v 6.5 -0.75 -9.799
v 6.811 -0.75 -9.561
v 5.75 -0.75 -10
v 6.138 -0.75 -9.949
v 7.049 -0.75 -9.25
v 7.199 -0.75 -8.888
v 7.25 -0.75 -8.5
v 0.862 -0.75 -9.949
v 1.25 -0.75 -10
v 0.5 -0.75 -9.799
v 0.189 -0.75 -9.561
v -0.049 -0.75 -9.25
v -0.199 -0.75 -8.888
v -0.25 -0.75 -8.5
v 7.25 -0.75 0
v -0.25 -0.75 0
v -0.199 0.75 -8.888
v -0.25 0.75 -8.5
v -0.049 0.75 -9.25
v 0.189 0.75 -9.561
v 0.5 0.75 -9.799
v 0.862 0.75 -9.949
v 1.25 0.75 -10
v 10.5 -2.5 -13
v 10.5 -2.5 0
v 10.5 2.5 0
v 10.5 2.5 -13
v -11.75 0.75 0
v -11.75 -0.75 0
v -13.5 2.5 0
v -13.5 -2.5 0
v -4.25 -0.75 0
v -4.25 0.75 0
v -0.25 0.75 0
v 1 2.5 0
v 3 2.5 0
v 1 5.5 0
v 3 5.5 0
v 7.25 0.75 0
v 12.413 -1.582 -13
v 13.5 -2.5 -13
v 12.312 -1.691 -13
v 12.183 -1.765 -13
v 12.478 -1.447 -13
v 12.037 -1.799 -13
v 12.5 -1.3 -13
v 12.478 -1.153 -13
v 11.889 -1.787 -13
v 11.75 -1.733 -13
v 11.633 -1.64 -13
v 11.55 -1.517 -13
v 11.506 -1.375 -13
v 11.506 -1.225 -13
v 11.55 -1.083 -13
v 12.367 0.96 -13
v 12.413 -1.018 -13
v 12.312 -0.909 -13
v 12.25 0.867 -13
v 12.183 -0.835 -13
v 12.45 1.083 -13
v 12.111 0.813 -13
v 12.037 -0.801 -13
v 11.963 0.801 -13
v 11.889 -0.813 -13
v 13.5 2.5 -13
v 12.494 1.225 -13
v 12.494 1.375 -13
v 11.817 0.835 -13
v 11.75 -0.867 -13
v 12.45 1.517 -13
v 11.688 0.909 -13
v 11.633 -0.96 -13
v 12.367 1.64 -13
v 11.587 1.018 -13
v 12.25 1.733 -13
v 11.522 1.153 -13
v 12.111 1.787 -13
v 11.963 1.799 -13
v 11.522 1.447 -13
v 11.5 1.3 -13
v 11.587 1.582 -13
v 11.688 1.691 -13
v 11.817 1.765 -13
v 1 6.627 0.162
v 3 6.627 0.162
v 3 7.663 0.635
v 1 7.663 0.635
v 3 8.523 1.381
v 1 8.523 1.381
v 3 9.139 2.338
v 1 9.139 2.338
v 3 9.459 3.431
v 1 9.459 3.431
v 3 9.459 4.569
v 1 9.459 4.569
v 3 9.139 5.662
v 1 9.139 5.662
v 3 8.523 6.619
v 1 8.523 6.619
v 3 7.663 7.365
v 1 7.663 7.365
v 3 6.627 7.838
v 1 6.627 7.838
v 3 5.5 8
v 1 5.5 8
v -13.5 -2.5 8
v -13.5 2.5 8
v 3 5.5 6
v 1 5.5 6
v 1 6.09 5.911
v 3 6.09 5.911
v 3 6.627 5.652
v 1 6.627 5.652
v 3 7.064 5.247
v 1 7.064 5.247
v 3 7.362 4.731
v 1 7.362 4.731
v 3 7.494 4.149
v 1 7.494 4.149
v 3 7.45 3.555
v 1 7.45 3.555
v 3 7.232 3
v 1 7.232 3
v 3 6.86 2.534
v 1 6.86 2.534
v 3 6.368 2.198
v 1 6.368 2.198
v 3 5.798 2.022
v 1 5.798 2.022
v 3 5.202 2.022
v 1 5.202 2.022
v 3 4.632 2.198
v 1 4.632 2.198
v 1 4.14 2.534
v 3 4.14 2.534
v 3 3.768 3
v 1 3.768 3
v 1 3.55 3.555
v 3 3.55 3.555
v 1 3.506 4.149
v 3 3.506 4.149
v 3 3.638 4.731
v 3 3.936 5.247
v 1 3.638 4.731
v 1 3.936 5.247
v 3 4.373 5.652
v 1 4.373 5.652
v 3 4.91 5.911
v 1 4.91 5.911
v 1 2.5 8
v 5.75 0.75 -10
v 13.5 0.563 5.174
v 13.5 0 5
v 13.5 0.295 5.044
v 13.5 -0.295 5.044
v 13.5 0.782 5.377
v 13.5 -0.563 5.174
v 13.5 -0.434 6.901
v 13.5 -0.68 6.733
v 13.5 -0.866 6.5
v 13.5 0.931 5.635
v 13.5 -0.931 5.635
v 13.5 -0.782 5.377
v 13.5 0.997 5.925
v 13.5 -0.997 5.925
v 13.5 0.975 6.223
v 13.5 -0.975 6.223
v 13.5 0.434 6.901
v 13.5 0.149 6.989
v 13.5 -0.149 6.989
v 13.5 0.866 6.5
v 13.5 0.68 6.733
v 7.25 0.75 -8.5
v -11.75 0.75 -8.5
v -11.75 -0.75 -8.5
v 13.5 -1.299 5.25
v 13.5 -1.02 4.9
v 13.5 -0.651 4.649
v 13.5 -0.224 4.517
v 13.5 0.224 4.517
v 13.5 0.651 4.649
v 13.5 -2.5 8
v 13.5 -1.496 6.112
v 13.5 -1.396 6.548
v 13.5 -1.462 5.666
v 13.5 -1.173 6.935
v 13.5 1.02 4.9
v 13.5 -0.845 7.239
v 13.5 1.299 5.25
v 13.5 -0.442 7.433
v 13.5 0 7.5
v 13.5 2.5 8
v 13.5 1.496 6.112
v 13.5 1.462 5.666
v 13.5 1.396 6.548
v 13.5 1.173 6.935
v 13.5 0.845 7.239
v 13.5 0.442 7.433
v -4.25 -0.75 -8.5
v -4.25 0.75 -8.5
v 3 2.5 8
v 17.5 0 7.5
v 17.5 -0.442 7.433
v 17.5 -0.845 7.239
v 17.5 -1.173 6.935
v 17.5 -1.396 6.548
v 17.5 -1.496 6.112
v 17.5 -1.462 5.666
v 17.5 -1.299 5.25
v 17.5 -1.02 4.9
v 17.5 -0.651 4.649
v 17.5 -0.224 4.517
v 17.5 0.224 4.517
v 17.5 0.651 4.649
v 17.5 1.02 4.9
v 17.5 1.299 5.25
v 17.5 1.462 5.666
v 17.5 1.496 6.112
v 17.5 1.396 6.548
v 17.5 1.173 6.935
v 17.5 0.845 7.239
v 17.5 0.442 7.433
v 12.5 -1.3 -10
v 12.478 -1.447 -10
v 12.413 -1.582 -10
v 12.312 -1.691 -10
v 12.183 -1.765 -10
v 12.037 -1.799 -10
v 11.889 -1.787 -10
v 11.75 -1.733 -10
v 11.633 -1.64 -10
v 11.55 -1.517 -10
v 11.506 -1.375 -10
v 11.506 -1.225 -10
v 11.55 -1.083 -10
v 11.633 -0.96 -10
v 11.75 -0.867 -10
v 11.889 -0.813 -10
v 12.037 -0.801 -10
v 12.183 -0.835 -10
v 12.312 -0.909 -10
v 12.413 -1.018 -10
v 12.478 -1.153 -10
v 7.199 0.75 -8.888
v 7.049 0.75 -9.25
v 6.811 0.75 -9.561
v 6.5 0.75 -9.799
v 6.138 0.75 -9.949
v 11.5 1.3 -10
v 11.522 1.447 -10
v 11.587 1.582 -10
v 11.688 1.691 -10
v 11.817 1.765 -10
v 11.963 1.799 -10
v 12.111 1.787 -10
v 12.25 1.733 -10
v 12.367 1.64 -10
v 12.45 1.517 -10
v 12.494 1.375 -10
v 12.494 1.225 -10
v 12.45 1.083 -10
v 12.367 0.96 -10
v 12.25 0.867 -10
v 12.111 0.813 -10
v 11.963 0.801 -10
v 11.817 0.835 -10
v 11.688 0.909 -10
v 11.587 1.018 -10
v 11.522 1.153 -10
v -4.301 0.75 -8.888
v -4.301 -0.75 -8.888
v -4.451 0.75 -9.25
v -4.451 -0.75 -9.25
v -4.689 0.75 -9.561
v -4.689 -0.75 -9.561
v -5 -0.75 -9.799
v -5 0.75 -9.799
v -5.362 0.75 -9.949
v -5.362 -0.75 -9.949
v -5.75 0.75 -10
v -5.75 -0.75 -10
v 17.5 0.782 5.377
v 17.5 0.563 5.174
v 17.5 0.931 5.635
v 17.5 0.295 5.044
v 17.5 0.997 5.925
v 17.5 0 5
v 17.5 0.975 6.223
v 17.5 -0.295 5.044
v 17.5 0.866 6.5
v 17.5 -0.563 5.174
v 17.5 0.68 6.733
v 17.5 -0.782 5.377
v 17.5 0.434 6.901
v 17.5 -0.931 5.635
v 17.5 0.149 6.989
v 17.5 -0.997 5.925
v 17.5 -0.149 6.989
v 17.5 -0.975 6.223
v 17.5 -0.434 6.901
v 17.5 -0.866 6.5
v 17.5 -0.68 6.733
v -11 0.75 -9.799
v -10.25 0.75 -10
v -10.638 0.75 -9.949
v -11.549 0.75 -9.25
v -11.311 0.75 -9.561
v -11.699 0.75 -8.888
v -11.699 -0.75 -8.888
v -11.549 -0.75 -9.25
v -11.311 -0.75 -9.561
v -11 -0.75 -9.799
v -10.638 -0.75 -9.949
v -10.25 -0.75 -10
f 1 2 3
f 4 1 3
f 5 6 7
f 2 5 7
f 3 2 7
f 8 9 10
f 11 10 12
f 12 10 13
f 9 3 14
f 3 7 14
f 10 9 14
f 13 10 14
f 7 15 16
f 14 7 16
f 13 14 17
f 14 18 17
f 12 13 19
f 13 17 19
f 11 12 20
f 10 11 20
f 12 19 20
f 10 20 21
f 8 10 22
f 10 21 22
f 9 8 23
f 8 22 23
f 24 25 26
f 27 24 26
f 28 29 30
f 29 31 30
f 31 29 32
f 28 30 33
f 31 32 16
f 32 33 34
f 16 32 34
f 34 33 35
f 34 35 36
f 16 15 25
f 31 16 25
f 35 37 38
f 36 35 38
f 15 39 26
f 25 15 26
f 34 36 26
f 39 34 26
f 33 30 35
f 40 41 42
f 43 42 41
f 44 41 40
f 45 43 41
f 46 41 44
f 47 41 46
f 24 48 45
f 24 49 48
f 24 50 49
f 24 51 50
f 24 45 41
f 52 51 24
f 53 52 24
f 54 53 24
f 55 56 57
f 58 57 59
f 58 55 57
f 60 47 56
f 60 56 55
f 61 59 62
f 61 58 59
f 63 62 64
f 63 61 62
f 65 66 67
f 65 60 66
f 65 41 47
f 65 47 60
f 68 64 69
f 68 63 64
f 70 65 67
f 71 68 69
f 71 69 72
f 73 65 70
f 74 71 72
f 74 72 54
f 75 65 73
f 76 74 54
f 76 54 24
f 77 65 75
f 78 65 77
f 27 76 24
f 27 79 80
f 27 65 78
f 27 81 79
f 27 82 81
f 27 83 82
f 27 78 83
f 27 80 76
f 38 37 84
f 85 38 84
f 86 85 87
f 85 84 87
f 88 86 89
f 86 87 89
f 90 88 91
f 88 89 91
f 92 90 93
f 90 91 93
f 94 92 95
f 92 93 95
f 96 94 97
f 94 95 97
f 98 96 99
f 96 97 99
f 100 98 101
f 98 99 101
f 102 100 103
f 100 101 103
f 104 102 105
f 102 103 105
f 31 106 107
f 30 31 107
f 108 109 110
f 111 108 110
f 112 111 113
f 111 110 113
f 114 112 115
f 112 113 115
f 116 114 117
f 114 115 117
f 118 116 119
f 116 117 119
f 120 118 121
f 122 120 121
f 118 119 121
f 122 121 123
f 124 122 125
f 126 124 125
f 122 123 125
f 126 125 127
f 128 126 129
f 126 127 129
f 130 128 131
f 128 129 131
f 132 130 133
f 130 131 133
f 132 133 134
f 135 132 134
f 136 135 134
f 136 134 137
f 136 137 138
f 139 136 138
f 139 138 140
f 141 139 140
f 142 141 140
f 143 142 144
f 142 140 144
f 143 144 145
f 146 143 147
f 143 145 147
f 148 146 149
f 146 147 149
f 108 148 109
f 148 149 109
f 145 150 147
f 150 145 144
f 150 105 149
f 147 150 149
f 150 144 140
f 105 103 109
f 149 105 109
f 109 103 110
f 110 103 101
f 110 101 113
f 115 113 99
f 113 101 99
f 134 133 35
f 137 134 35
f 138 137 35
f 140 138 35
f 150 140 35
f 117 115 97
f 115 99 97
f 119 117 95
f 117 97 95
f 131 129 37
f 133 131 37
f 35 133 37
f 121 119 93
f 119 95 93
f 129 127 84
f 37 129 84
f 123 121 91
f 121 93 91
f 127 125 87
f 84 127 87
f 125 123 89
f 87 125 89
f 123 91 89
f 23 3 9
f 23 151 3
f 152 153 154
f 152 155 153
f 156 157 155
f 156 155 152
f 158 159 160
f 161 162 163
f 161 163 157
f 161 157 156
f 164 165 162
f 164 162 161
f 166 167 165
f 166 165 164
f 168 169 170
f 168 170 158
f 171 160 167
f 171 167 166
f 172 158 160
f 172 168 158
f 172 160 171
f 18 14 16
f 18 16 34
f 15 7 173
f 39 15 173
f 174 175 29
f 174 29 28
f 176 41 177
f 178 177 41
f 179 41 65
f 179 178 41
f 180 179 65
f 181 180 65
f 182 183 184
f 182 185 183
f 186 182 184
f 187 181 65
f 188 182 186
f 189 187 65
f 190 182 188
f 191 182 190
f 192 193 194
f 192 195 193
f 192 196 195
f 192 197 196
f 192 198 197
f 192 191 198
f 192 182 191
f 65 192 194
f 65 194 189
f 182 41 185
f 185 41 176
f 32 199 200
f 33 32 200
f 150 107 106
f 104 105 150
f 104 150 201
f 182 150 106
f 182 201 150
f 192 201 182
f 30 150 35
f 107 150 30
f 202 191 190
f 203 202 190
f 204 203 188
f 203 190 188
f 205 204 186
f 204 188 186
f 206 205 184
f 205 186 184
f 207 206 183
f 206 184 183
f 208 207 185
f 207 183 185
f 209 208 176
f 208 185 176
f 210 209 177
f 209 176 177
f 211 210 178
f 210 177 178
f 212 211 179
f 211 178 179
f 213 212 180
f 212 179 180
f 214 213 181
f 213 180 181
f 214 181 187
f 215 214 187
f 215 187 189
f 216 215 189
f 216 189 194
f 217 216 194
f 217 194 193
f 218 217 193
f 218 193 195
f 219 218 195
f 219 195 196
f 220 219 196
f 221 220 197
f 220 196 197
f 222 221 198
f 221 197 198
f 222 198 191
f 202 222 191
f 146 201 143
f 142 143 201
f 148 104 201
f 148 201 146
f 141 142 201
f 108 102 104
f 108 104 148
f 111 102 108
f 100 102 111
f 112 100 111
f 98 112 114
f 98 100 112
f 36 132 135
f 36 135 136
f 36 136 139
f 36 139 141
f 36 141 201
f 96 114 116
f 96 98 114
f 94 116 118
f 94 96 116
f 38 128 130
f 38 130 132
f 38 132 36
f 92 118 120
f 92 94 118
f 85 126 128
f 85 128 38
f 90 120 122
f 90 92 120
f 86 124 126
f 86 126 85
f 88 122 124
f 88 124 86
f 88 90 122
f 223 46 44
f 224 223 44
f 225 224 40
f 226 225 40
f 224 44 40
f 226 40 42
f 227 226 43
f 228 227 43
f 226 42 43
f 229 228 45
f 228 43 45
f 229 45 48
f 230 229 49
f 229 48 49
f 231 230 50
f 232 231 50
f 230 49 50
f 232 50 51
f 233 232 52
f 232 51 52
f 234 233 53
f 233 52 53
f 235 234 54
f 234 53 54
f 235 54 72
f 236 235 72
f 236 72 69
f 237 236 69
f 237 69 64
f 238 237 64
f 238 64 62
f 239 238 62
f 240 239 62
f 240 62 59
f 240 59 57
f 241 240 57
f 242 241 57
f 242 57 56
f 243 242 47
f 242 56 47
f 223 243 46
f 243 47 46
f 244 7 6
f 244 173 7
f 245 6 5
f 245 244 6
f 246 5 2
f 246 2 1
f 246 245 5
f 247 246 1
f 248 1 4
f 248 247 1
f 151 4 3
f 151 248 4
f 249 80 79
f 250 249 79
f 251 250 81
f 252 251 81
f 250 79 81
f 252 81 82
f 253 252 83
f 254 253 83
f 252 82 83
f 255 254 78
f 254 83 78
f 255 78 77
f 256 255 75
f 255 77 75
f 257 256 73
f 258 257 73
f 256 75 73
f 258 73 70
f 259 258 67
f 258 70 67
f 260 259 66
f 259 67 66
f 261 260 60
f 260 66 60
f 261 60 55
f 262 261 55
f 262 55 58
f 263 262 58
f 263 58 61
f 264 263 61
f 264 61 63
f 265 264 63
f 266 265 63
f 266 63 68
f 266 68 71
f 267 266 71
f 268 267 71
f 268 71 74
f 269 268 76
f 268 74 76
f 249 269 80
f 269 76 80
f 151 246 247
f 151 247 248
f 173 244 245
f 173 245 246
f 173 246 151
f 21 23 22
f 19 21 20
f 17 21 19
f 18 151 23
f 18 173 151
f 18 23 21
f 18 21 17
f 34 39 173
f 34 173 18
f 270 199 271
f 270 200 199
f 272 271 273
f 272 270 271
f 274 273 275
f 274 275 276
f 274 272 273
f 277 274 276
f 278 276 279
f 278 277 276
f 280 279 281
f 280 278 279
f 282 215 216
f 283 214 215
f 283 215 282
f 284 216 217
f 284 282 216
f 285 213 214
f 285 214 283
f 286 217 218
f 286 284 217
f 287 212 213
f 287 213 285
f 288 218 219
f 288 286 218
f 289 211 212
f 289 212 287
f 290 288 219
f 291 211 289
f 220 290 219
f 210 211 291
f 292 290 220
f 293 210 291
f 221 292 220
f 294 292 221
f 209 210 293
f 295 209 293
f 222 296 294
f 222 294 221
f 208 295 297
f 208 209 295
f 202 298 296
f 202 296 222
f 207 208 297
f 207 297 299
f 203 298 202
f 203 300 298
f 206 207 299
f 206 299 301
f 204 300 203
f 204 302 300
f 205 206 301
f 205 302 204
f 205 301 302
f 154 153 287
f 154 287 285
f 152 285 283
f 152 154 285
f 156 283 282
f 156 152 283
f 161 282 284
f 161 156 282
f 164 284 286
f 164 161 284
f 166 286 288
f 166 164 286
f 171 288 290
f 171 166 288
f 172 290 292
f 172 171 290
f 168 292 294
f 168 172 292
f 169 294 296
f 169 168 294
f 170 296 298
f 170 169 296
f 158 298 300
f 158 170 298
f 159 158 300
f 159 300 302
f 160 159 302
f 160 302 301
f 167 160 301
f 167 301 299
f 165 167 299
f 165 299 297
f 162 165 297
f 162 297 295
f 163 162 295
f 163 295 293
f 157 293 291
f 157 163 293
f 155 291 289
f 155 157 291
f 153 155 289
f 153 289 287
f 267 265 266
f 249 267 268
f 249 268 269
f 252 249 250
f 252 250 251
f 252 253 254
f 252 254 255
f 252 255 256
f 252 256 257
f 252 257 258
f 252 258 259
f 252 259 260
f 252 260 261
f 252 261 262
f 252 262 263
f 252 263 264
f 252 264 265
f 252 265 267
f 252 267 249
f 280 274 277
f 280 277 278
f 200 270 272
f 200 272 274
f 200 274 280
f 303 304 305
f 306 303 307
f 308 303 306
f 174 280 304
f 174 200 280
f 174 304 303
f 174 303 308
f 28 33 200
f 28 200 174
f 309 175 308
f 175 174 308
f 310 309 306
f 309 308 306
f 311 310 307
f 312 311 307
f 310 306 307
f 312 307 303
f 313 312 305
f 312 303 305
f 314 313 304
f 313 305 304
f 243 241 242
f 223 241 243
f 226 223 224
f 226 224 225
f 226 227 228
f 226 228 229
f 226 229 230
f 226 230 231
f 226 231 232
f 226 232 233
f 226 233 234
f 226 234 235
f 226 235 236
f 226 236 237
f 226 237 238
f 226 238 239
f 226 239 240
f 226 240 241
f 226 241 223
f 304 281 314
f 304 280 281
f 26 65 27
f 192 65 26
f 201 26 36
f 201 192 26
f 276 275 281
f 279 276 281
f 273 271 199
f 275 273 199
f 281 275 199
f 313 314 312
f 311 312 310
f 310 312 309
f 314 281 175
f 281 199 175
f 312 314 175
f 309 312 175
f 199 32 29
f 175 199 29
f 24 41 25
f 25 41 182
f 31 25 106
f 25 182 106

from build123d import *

# Parameters (mm, degrees)
SKETCH_1_W          = 27
SKETCH_1_H          = 5
EXTRUDE_1_DEPTH     = 8
SKETCH_2_W          = 3
SKETCH_2_H          = 5
EXTRUDE_2_DEPTH     = 13
SKETCH_3_R          = 0.5
CUT_EXTRUDE_1_DEPTH = 3
SKETCH_4_R          = 1.5
SKETCH_4_R_2        = 1
EXTRUDE_3_DEPTH     = 4
SKETCH_6_R          = 2
EXTRUDE_5_DEPTH     = 2
SKETCH_7_W          = 7.5
SKETCH_7_H          = 1.5
EXTRUDE_6_DEPTH     = 10
FILLET_1_R          = 1.5


with BuildPart() as part:
    # 草图1 → 凸台-拉伸1 (new body)
    with BuildSketch(Plane.XY):
        Rectangle(SKETCH_1_W, SKETCH_1_H)
    extrude(amount=EXTRUDE_1_DEPTH)

    # 草图2 → 凸台-拉伸2 (add)
    with BuildSketch(Plane(origin=(0, 0, 0), x_dir=(-1, 0, 0), z_dir=(0, 0, -1))):
        with Locations((-12, 0)):
            Rectangle(SKETCH_2_W, SKETCH_2_H)
    extrude(amount=EXTRUDE_2_DEPTH)

    # 草图3 → 切除-拉伸1 (cut)
    with BuildSketch(Plane(origin=(0, 0, -13), x_dir=(-1, 0, 0), z_dir=(0, 0, -1))):
        with Locations((-12, 1.3)):
            Circle(SKETCH_3_R)
        with Locations(Location((-12, -1.3, 0), (0, 0, 180))):
            Circle(SKETCH_3_R)
    extrude(amount=-CUT_EXTRUDE_1_DEPTH, mode=Mode.SUBTRACT)

    # 草图4 → 凸台-拉伸3 (add)
    with BuildSketch(Plane(origin=(13.5, 0, 0), x_dir=(0, 0, -1), z_dir=(1, 0, 0))):
        with Locations(Location((-6, 0, 0), (0, 0, 180))):
            Circle(SKETCH_4_R)
        with Locations((-6, 0)):
            Circle(SKETCH_4_R_2, mode=Mode.SUBTRACT)
    extrude(amount=EXTRUDE_3_DEPTH)

    # 草图6 → 凸台-拉伸5 (add)
    with BuildSketch(Plane.ZY.offset(-1)):
        with BuildLine():
            Line((8, 2.5), (0, 2.5))
            Line((0, 2.5), (0, 5.5))
            ThreePointArc((0, 5.5), (4, 9.5), (8, 5.5))
            Line((8, 5.5), (8, 2.5))
        make_face()
        with Locations((4, 5.5)):
            Circle(SKETCH_6_R, mode=Mode.SUBTRACT)
    extrude(amount=-EXTRUDE_5_DEPTH)

    # 草图7 → 凸台-拉伸6 (add)
    with BuildSketch(Plane(origin=(0, 0, 0), x_dir=(-1, 0, 0), z_dir=(0, 0, -1))):
        with Locations((-3.5, 0)):
            Rectangle(SKETCH_7_W, SKETCH_7_H)
        with Locations((8, 0)):
            Rectangle(SKETCH_7_W, SKETCH_7_H)
    extrude(amount=EXTRUDE_6_DEPTH)

    # 圆角1
    fillet_1_edges = [part.edges().sort_by_distance(p)[0] for p in [
        (7.25, 0, -10),
        (-0.25, 0, -10),
        (-4.25, 0, -10),
        (-11.75, 0, -10),
    ]]
    fillet(fillet_1_edges, radius=FILLET_1_R)


solid = part.part
